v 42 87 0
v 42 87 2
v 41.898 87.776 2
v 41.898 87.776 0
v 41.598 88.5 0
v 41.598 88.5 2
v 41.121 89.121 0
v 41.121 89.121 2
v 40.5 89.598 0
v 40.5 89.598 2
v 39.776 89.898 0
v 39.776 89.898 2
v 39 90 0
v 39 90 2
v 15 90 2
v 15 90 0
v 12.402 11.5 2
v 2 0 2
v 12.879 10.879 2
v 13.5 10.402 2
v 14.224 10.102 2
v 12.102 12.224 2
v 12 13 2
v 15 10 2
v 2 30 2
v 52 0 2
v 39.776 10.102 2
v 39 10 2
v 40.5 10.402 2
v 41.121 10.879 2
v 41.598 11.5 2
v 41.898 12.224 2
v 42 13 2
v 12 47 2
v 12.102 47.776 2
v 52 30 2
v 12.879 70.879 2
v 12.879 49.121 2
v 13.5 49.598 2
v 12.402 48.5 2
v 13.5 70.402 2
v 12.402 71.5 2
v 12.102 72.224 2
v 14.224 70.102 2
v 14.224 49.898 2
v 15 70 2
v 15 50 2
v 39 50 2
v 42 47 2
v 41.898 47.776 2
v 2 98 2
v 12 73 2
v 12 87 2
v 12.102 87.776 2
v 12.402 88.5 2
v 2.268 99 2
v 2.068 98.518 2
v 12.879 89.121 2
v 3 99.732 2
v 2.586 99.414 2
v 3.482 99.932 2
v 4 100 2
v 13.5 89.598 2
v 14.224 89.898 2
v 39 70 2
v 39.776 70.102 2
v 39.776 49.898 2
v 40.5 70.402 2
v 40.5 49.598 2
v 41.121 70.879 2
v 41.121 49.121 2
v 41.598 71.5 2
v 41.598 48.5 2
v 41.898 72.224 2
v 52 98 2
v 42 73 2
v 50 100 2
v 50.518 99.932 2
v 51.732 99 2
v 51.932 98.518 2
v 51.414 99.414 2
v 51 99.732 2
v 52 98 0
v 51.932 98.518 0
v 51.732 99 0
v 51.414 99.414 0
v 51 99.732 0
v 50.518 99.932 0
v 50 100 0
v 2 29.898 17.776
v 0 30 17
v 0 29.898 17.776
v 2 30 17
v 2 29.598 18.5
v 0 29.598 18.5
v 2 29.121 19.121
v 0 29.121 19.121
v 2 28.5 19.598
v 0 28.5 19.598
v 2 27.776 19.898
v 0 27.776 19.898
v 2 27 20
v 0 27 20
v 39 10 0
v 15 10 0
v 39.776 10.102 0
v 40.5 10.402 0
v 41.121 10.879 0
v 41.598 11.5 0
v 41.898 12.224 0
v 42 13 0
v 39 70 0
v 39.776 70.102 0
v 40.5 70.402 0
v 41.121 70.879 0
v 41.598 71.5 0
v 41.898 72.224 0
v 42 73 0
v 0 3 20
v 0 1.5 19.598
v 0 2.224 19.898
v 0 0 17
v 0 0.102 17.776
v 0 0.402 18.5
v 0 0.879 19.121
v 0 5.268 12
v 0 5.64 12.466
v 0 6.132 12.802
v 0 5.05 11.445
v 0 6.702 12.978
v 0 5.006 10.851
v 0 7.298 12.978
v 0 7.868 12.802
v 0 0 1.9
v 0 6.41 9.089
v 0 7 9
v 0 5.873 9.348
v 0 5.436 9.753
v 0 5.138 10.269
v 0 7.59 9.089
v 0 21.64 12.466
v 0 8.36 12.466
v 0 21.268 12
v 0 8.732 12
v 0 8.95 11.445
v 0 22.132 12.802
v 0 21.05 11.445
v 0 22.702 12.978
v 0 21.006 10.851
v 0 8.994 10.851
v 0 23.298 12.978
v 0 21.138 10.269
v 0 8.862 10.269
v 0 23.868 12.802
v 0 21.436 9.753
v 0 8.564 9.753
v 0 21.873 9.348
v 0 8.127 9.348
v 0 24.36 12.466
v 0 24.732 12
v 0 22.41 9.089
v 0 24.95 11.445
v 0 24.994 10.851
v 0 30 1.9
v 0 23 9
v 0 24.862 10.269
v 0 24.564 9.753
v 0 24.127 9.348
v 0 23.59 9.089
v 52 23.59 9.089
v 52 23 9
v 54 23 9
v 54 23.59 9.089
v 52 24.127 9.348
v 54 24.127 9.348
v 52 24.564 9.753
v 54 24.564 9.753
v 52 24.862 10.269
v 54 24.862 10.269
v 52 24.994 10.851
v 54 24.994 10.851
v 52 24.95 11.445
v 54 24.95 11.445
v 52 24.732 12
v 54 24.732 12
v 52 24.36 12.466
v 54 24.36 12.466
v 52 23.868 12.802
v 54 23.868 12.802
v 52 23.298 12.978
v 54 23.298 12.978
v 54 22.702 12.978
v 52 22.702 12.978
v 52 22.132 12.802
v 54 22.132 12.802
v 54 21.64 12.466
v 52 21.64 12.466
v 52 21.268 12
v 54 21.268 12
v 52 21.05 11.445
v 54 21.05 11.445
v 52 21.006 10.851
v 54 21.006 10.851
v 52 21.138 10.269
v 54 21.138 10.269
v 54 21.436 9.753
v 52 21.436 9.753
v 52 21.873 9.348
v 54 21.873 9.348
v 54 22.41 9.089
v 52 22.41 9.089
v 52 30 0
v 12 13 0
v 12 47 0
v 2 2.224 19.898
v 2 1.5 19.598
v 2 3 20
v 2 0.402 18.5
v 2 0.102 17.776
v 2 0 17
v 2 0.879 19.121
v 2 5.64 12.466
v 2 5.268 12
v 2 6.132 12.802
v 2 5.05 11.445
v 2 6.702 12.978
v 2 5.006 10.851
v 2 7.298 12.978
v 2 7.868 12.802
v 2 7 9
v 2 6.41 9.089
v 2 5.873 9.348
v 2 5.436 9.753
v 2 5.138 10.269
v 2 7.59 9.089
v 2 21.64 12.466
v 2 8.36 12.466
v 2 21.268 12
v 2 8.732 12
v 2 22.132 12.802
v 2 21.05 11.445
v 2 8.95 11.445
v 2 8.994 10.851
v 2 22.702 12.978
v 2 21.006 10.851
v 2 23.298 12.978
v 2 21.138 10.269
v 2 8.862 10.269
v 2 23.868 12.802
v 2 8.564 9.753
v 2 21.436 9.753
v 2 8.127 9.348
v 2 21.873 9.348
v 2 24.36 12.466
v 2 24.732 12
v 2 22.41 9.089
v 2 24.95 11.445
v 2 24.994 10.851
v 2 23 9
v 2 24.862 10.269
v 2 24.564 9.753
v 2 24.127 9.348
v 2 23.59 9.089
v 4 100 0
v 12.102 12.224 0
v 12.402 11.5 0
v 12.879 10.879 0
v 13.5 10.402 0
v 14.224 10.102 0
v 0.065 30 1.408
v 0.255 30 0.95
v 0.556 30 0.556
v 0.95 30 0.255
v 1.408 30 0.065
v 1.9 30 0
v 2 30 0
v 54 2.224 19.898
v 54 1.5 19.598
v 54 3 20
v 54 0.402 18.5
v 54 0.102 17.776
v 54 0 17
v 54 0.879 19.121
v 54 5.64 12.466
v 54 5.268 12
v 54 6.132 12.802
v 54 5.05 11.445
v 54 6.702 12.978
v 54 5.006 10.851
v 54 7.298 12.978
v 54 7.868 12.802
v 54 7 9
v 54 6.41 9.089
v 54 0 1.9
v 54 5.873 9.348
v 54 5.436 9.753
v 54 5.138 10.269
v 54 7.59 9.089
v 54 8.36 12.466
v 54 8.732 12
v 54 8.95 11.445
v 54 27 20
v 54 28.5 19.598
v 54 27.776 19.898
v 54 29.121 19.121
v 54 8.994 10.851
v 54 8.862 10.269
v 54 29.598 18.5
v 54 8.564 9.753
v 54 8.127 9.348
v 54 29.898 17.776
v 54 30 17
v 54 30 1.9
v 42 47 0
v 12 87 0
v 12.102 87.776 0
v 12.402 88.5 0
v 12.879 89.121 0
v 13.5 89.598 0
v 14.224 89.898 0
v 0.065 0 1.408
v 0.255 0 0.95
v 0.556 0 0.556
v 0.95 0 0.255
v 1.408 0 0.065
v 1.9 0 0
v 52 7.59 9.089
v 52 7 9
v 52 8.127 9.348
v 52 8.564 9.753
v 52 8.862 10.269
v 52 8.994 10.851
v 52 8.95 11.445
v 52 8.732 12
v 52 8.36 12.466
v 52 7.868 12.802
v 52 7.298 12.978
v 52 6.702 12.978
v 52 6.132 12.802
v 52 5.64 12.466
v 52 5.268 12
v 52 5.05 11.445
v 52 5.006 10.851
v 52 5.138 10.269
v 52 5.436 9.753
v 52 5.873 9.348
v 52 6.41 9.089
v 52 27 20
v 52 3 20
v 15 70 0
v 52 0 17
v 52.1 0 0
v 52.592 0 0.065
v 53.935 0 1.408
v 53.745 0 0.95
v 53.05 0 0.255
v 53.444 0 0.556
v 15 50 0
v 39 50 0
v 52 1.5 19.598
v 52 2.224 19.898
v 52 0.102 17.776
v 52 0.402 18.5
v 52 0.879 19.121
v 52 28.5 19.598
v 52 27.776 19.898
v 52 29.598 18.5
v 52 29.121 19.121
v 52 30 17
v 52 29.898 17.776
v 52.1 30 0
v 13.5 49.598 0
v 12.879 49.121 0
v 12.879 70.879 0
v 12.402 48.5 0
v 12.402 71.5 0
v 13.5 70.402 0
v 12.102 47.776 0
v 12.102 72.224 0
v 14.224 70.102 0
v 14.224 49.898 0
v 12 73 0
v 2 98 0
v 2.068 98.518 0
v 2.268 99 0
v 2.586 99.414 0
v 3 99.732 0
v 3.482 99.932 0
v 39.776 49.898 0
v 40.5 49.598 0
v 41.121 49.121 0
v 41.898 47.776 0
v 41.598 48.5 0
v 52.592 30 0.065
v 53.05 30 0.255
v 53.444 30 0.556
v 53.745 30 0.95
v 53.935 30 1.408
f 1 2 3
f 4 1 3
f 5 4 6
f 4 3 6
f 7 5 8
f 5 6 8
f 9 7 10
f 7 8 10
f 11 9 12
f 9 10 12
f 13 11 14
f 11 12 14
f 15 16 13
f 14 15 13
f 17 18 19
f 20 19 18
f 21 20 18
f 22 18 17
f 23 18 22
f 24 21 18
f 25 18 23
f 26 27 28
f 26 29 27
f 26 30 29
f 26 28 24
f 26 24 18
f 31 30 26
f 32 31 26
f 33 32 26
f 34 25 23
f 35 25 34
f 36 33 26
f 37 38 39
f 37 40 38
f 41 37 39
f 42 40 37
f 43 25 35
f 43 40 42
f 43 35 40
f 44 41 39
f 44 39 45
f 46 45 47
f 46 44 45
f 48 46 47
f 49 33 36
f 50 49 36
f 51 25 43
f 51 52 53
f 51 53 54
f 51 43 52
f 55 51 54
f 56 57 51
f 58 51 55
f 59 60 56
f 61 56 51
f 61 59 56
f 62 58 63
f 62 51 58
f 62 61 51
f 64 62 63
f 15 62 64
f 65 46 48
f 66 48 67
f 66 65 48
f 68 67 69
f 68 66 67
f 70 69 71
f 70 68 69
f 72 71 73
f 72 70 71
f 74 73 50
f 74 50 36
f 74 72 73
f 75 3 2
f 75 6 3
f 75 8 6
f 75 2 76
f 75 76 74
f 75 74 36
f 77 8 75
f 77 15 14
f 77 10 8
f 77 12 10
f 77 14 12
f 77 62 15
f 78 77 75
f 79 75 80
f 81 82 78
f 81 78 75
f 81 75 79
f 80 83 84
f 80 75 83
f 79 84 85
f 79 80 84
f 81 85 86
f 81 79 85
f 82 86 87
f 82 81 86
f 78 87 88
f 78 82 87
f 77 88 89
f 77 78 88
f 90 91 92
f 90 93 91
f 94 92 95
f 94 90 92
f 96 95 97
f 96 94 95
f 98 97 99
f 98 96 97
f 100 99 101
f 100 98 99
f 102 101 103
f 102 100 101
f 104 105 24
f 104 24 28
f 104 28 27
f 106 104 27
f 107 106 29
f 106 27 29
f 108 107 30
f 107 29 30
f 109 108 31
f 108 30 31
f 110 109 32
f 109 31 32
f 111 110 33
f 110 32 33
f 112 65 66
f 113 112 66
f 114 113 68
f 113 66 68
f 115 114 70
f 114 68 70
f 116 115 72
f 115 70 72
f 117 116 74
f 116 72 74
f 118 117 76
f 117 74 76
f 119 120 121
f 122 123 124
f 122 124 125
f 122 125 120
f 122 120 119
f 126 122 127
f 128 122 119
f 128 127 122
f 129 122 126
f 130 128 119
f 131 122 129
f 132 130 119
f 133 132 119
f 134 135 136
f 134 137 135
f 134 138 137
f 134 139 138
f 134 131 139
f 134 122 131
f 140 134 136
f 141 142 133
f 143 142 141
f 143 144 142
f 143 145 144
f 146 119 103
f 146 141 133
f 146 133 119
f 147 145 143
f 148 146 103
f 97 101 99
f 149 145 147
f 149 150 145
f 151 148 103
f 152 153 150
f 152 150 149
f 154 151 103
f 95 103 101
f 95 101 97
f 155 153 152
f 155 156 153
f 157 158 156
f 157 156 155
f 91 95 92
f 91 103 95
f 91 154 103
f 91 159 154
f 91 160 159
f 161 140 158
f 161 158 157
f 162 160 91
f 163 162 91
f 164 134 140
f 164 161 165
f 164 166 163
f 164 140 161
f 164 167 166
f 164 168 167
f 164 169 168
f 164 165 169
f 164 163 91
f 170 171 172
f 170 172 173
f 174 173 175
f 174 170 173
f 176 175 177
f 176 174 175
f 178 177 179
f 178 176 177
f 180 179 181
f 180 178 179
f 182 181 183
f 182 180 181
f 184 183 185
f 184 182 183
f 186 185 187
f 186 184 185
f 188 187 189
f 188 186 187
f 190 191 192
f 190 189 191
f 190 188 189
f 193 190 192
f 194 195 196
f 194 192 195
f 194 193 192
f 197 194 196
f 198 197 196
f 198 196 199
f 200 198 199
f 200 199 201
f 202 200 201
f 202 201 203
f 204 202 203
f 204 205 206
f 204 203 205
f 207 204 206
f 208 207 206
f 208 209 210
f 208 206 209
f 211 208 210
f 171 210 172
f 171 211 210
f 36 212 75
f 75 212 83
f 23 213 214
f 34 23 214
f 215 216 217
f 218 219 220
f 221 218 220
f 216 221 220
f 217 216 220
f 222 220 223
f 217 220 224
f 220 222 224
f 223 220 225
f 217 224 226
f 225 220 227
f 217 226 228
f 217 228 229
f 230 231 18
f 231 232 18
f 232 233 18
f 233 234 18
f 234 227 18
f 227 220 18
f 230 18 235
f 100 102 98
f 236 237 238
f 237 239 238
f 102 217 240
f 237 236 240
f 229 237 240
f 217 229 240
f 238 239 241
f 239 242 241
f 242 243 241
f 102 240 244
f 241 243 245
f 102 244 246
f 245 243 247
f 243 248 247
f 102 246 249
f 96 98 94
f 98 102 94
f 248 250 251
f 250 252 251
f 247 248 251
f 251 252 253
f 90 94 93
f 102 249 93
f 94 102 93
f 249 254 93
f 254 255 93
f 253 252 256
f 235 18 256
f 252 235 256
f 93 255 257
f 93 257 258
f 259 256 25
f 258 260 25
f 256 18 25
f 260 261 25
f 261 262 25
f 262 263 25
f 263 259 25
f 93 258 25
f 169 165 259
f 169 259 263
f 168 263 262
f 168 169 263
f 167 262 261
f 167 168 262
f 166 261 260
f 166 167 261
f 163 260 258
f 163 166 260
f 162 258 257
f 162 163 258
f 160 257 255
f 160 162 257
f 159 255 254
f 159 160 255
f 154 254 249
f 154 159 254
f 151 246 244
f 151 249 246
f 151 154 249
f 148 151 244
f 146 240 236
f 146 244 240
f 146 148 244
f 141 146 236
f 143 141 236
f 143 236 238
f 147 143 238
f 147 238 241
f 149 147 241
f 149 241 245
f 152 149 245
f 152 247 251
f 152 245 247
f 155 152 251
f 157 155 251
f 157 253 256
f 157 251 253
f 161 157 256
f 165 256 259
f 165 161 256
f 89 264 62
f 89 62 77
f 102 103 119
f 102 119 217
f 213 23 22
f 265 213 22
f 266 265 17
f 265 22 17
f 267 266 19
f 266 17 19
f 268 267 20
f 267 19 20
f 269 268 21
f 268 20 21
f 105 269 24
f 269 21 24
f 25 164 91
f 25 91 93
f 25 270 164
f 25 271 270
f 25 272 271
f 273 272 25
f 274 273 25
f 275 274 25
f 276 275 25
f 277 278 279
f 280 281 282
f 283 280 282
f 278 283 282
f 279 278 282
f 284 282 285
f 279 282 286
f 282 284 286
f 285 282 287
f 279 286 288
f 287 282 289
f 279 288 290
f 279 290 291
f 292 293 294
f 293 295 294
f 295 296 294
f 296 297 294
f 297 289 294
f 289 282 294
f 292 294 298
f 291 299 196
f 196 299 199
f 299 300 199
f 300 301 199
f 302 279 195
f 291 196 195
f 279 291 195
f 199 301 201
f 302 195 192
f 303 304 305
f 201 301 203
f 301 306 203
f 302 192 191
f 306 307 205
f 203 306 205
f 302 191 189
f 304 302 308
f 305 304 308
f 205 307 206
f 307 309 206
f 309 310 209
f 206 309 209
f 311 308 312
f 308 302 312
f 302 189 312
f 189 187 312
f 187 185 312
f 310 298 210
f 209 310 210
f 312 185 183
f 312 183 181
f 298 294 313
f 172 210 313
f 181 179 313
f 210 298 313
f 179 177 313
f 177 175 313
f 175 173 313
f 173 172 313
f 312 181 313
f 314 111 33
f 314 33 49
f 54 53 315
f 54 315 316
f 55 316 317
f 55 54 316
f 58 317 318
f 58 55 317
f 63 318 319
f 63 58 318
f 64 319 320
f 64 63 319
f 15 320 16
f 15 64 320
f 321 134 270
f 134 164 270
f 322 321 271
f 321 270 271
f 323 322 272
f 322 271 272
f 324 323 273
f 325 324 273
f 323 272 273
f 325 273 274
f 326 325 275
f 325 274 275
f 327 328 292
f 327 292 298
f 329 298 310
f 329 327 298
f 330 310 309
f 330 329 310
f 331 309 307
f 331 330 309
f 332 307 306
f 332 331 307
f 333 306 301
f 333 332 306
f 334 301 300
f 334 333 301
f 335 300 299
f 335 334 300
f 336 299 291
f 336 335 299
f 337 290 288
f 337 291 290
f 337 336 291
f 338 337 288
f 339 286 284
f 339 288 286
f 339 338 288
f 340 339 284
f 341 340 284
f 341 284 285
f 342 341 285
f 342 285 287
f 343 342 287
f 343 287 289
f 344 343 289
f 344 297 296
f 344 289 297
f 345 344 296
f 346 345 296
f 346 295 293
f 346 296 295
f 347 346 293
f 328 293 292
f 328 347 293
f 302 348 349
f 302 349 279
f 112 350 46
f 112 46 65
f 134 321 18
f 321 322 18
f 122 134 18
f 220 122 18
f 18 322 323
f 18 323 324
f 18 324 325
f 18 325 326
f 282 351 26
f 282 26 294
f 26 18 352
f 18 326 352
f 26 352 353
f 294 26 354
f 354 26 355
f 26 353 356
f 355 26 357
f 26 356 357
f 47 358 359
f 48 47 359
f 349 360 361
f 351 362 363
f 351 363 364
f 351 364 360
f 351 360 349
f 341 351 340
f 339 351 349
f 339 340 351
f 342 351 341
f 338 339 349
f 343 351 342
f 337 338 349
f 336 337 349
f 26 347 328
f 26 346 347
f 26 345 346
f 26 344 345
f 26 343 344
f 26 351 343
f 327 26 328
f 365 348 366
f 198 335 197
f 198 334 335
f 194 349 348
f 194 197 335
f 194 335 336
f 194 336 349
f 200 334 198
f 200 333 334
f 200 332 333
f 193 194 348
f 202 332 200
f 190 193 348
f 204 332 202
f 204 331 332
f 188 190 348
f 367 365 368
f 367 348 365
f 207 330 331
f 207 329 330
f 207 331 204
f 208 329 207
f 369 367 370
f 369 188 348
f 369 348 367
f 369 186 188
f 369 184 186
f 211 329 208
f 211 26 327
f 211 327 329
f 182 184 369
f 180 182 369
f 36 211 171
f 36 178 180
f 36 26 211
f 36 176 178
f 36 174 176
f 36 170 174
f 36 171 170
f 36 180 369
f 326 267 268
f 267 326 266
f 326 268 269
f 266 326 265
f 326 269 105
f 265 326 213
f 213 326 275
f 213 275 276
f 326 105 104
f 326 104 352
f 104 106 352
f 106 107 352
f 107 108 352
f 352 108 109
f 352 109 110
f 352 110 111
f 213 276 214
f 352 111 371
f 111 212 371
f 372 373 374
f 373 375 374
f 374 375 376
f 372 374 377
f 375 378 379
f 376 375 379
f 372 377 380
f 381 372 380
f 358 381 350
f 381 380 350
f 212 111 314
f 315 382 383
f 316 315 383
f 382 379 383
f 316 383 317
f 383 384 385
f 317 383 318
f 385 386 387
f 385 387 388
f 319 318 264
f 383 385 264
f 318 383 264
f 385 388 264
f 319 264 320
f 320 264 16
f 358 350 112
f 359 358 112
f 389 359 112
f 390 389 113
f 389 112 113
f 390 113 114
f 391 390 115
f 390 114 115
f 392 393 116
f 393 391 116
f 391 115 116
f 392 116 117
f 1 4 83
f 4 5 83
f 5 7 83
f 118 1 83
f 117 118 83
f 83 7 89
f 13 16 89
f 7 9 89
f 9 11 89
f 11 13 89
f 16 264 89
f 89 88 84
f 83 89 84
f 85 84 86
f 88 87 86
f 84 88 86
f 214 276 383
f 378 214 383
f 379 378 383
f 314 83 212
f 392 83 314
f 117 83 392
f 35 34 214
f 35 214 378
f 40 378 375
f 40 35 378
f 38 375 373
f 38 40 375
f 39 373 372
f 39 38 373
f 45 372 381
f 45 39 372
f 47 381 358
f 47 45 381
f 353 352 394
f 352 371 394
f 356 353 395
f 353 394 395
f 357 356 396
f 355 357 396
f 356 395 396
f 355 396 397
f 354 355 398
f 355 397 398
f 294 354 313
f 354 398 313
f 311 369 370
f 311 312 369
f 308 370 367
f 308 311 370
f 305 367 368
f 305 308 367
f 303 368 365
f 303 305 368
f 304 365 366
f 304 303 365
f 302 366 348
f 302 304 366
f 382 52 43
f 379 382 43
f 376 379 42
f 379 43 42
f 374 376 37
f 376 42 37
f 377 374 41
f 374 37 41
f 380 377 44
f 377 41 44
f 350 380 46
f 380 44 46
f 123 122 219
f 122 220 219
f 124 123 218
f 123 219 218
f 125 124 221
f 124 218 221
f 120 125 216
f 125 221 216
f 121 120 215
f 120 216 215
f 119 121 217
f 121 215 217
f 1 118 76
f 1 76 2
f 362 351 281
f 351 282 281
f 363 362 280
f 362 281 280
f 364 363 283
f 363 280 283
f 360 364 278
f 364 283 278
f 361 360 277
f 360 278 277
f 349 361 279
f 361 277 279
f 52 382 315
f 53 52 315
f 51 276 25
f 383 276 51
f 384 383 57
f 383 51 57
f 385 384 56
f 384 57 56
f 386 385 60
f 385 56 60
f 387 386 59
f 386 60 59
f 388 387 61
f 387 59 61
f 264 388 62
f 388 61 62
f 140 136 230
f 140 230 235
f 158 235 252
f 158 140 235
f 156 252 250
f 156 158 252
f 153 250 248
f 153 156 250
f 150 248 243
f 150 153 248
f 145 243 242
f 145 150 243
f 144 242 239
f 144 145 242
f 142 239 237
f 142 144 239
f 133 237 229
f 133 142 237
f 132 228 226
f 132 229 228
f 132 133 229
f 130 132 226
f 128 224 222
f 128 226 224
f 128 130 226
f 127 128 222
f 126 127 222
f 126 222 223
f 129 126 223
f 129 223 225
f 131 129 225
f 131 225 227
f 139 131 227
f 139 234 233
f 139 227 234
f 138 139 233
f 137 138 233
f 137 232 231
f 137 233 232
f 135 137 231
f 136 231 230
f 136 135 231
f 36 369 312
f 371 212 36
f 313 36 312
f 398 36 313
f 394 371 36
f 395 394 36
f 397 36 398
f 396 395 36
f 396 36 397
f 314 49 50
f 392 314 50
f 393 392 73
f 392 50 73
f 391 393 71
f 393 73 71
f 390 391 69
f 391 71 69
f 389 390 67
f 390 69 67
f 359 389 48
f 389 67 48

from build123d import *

# Parameters (mm, degrees)
CYLINDER002_R     = 2
CYLINDER002_DEPTH = 10
CYLINDER003_R     = 2
CYLINDER003_DEPTH = 10
BOX004_W          = 2
BOX004_H          = 30
BOX004_DEPTH      = 20
FILLET004_R       = 3
FILLET005_R       = 1.9
CYLINDER_R        = 2
CYLINDER_DEPTH    = 10
CYLINDER001_R     = 2
CYLINDER001_DEPTH = 10
BOX003_W          = 2
BOX003_H          = 30
BOX003_DEPTH      = 20
FILLET003_R       = 3
FILLET006_R       = 1.9
BOX002_W          = 30
BOX002_H          = 40
BOX002_DEPTH      = 10
FILLET002_R       = 3
BOX001_W          = 30
BOX001_H          = 20
BOX001_DEPTH      = 10
FILLET001_R       = 3
BOX_W             = 50
BOX_H             = 100
BOX_DEPTH         = 2
FILLET_R          = 2


with BuildPart() as cilindre002:
    # Cylinder002 → Cylinder002 (new body)
    with BuildSketch(Plane(origin=(-4, 7, 11), x_dir=(0, 0, -1), z_dir=(1, 0, 0))):
        Circle(CYLINDER002_R)
    extrude(amount=CYLINDER002_DEPTH)


with BuildPart() as cilindre003:
    # Cylinder003 → Cylinder003 (new body)
    with BuildSketch(Plane(origin=(-4, 23, 11), x_dir=(0, 0, -1), z_dir=(1, 0, 0))):
        Circle(CYLINDER003_R)
    extrude(amount=CYLINDER003_DEPTH)


with BuildPart() as fillet005:
    # Box004 → Box004 (new body)
    with BuildSketch(Plane.XY):
        with Locations((1, 15)):
            Rectangle(BOX004_W, BOX004_H)
    extrude(amount=BOX004_DEPTH)

    # Fillet004
    fillet004_edges = [fillet005.edges().sort_by_distance(p)[0] for p in [
        (1, 0, 20),
        (1, 30, 20),
    ]]
    fillet(fillet004_edges, radius=FILLET004_R)

    # Cut004: cut Cilindre003
    add(cilindre003.part, mode=Mode.SUBTRACT)

    # Cut005: cut Cilindre002
    add(cilindre002.part, mode=Mode.SUBTRACT)


with BuildPart() as fillet005_1:
    # Cut005 placement: moved
    add(fillet005.part.moved(Location((52, 0, 0))))

    # Fillet005
    fillet005_edges = [fillet005_1.edges().sort_by_distance(p)[0] for p in [
        (54, 15, 0),
    ]]
    fillet(fillet005_edges, radius=FILLET005_R)


with BuildPart() as cilindre:
    # Cylinder → Cylinder (new body)
    with BuildSketch(Plane(origin=(-4, 7, 11), x_dir=(0, 0, -1), z_dir=(1, 0, 0))):
        Circle(CYLINDER_R)
    extrude(amount=CYLINDER_DEPTH)


with BuildPart() as cilindre001:
    # Cylinder001 → Cylinder001 (new body)
    with BuildSketch(Plane(origin=(-4, 23, 11), x_dir=(0, 0, -1), z_dir=(1, 0, 0))):
        Circle(CYLINDER001_R)
    extrude(amount=CYLINDER001_DEPTH)


with BuildPart() as fillet006:
    # Box003 → Box003 (new body)
    with BuildSketch(Plane.XY):
        with Locations((1, 15)):
            Rectangle(BOX003_W, BOX003_H)
    extrude(amount=BOX003_DEPTH)

    # Fillet003
    fillet003_edges = [fillet006.edges().sort_by_distance(p)[0] for p in [
        (1, 0, 20),
        (1, 30, 20),
    ]]
    fillet(fillet003_edges, radius=FILLET003_R)

    # Cut002: cut Cilindre001
    add(cilindre001.part, mode=Mode.SUBTRACT)

    # Cut003: cut Cilindre
    add(cilindre.part, mode=Mode.SUBTRACT)

    # Fillet006
    fillet006_edges = [fillet006.edges().sort_by_distance(p)[0] for p in [
        (0, 15, 0),
    ]]
    fillet(fillet006_edges, radius=FILLET006_R)


with BuildPart() as fusion:
    # Fusion base: copy of Fillet006
    add(fillet006.part)

    # Fusion: union Fillet005
    add(fillet005_1.part)


with BuildPart() as forat2:
    # Box002 → Box002 (new body)
    with BuildSketch(Plane.XY):
        with Locations((15, 20)):
            Rectangle(BOX002_W, BOX002_H)
    extrude(amount=BOX002_DEPTH)

    # Fillet002
    fillet002_edges = [forat2.edges().sort_by_distance(p)[0] for p in [
        (0, 0, 5),
        (0, 40, 5),
        (30, 0, 5),
        (30, 40, 5),
    ]]
    fillet(fillet002_edges, radius=FILLET002_R)


with BuildPart() as forat2_1:
    # Fillet002 placement: moved
    add(forat2.part.moved(Location((10, 10, -5))))


with BuildPart() as forat1:
    # Box001 → Box001 (new body)
    with BuildSketch(Plane.XY):
        with Locations((15, 10)):
            Rectangle(BOX001_W, BOX001_H)
    extrude(amount=BOX001_DEPTH)

    # Fillet001
    fillet001_edges = [forat1.edges().sort_by_distance(p)[0] for p in [
        (0, 0, 5),
        (0, 20, 5),
        (30, 0, 5),
        (30, 20, 5),
    ]]
    fillet(fillet001_edges, radius=FILLET001_R)


with BuildPart() as forat1_1:
    # Fillet001 placement: moved
    add(forat1.part.moved(Location((10, 70, -5))))


with BuildPart() as base:
    # Box → Box (new body)
    with BuildSketch(Plane.XY):
        with Locations((25, 50)):
            Rectangle(BOX_W, BOX_H)
    extrude(amount=BOX_DEPTH)

    # Fillet
    fillet_edges = [base.edges().sort_by_distance(p)[0] for p in [
        (0, 100, 1),
        (50, 100, 1),
    ]]
    fillet(fillet_edges, radius=FILLET_R)

    # Cut: cut forat1
    add(forat1_1.part, mode=Mode.SUBTRACT)

    # Cut001: cut forat2
    add(forat2_1.part, mode=Mode.SUBTRACT)


with BuildPart() as base_1:
    # Cut001 placement: moved
    add(base.part.moved(Location((2, 0, 0))))


with BuildPart() as fusion001:
    # Fusion001 base: copy of Fillet006
    add(fillet006.part)

    # Fusion001: union Fillet005, Fusion, base
    add(fillet005_1.part)
    add(fusion.part)
    add(base_1.part)


solid = fusion001.part
